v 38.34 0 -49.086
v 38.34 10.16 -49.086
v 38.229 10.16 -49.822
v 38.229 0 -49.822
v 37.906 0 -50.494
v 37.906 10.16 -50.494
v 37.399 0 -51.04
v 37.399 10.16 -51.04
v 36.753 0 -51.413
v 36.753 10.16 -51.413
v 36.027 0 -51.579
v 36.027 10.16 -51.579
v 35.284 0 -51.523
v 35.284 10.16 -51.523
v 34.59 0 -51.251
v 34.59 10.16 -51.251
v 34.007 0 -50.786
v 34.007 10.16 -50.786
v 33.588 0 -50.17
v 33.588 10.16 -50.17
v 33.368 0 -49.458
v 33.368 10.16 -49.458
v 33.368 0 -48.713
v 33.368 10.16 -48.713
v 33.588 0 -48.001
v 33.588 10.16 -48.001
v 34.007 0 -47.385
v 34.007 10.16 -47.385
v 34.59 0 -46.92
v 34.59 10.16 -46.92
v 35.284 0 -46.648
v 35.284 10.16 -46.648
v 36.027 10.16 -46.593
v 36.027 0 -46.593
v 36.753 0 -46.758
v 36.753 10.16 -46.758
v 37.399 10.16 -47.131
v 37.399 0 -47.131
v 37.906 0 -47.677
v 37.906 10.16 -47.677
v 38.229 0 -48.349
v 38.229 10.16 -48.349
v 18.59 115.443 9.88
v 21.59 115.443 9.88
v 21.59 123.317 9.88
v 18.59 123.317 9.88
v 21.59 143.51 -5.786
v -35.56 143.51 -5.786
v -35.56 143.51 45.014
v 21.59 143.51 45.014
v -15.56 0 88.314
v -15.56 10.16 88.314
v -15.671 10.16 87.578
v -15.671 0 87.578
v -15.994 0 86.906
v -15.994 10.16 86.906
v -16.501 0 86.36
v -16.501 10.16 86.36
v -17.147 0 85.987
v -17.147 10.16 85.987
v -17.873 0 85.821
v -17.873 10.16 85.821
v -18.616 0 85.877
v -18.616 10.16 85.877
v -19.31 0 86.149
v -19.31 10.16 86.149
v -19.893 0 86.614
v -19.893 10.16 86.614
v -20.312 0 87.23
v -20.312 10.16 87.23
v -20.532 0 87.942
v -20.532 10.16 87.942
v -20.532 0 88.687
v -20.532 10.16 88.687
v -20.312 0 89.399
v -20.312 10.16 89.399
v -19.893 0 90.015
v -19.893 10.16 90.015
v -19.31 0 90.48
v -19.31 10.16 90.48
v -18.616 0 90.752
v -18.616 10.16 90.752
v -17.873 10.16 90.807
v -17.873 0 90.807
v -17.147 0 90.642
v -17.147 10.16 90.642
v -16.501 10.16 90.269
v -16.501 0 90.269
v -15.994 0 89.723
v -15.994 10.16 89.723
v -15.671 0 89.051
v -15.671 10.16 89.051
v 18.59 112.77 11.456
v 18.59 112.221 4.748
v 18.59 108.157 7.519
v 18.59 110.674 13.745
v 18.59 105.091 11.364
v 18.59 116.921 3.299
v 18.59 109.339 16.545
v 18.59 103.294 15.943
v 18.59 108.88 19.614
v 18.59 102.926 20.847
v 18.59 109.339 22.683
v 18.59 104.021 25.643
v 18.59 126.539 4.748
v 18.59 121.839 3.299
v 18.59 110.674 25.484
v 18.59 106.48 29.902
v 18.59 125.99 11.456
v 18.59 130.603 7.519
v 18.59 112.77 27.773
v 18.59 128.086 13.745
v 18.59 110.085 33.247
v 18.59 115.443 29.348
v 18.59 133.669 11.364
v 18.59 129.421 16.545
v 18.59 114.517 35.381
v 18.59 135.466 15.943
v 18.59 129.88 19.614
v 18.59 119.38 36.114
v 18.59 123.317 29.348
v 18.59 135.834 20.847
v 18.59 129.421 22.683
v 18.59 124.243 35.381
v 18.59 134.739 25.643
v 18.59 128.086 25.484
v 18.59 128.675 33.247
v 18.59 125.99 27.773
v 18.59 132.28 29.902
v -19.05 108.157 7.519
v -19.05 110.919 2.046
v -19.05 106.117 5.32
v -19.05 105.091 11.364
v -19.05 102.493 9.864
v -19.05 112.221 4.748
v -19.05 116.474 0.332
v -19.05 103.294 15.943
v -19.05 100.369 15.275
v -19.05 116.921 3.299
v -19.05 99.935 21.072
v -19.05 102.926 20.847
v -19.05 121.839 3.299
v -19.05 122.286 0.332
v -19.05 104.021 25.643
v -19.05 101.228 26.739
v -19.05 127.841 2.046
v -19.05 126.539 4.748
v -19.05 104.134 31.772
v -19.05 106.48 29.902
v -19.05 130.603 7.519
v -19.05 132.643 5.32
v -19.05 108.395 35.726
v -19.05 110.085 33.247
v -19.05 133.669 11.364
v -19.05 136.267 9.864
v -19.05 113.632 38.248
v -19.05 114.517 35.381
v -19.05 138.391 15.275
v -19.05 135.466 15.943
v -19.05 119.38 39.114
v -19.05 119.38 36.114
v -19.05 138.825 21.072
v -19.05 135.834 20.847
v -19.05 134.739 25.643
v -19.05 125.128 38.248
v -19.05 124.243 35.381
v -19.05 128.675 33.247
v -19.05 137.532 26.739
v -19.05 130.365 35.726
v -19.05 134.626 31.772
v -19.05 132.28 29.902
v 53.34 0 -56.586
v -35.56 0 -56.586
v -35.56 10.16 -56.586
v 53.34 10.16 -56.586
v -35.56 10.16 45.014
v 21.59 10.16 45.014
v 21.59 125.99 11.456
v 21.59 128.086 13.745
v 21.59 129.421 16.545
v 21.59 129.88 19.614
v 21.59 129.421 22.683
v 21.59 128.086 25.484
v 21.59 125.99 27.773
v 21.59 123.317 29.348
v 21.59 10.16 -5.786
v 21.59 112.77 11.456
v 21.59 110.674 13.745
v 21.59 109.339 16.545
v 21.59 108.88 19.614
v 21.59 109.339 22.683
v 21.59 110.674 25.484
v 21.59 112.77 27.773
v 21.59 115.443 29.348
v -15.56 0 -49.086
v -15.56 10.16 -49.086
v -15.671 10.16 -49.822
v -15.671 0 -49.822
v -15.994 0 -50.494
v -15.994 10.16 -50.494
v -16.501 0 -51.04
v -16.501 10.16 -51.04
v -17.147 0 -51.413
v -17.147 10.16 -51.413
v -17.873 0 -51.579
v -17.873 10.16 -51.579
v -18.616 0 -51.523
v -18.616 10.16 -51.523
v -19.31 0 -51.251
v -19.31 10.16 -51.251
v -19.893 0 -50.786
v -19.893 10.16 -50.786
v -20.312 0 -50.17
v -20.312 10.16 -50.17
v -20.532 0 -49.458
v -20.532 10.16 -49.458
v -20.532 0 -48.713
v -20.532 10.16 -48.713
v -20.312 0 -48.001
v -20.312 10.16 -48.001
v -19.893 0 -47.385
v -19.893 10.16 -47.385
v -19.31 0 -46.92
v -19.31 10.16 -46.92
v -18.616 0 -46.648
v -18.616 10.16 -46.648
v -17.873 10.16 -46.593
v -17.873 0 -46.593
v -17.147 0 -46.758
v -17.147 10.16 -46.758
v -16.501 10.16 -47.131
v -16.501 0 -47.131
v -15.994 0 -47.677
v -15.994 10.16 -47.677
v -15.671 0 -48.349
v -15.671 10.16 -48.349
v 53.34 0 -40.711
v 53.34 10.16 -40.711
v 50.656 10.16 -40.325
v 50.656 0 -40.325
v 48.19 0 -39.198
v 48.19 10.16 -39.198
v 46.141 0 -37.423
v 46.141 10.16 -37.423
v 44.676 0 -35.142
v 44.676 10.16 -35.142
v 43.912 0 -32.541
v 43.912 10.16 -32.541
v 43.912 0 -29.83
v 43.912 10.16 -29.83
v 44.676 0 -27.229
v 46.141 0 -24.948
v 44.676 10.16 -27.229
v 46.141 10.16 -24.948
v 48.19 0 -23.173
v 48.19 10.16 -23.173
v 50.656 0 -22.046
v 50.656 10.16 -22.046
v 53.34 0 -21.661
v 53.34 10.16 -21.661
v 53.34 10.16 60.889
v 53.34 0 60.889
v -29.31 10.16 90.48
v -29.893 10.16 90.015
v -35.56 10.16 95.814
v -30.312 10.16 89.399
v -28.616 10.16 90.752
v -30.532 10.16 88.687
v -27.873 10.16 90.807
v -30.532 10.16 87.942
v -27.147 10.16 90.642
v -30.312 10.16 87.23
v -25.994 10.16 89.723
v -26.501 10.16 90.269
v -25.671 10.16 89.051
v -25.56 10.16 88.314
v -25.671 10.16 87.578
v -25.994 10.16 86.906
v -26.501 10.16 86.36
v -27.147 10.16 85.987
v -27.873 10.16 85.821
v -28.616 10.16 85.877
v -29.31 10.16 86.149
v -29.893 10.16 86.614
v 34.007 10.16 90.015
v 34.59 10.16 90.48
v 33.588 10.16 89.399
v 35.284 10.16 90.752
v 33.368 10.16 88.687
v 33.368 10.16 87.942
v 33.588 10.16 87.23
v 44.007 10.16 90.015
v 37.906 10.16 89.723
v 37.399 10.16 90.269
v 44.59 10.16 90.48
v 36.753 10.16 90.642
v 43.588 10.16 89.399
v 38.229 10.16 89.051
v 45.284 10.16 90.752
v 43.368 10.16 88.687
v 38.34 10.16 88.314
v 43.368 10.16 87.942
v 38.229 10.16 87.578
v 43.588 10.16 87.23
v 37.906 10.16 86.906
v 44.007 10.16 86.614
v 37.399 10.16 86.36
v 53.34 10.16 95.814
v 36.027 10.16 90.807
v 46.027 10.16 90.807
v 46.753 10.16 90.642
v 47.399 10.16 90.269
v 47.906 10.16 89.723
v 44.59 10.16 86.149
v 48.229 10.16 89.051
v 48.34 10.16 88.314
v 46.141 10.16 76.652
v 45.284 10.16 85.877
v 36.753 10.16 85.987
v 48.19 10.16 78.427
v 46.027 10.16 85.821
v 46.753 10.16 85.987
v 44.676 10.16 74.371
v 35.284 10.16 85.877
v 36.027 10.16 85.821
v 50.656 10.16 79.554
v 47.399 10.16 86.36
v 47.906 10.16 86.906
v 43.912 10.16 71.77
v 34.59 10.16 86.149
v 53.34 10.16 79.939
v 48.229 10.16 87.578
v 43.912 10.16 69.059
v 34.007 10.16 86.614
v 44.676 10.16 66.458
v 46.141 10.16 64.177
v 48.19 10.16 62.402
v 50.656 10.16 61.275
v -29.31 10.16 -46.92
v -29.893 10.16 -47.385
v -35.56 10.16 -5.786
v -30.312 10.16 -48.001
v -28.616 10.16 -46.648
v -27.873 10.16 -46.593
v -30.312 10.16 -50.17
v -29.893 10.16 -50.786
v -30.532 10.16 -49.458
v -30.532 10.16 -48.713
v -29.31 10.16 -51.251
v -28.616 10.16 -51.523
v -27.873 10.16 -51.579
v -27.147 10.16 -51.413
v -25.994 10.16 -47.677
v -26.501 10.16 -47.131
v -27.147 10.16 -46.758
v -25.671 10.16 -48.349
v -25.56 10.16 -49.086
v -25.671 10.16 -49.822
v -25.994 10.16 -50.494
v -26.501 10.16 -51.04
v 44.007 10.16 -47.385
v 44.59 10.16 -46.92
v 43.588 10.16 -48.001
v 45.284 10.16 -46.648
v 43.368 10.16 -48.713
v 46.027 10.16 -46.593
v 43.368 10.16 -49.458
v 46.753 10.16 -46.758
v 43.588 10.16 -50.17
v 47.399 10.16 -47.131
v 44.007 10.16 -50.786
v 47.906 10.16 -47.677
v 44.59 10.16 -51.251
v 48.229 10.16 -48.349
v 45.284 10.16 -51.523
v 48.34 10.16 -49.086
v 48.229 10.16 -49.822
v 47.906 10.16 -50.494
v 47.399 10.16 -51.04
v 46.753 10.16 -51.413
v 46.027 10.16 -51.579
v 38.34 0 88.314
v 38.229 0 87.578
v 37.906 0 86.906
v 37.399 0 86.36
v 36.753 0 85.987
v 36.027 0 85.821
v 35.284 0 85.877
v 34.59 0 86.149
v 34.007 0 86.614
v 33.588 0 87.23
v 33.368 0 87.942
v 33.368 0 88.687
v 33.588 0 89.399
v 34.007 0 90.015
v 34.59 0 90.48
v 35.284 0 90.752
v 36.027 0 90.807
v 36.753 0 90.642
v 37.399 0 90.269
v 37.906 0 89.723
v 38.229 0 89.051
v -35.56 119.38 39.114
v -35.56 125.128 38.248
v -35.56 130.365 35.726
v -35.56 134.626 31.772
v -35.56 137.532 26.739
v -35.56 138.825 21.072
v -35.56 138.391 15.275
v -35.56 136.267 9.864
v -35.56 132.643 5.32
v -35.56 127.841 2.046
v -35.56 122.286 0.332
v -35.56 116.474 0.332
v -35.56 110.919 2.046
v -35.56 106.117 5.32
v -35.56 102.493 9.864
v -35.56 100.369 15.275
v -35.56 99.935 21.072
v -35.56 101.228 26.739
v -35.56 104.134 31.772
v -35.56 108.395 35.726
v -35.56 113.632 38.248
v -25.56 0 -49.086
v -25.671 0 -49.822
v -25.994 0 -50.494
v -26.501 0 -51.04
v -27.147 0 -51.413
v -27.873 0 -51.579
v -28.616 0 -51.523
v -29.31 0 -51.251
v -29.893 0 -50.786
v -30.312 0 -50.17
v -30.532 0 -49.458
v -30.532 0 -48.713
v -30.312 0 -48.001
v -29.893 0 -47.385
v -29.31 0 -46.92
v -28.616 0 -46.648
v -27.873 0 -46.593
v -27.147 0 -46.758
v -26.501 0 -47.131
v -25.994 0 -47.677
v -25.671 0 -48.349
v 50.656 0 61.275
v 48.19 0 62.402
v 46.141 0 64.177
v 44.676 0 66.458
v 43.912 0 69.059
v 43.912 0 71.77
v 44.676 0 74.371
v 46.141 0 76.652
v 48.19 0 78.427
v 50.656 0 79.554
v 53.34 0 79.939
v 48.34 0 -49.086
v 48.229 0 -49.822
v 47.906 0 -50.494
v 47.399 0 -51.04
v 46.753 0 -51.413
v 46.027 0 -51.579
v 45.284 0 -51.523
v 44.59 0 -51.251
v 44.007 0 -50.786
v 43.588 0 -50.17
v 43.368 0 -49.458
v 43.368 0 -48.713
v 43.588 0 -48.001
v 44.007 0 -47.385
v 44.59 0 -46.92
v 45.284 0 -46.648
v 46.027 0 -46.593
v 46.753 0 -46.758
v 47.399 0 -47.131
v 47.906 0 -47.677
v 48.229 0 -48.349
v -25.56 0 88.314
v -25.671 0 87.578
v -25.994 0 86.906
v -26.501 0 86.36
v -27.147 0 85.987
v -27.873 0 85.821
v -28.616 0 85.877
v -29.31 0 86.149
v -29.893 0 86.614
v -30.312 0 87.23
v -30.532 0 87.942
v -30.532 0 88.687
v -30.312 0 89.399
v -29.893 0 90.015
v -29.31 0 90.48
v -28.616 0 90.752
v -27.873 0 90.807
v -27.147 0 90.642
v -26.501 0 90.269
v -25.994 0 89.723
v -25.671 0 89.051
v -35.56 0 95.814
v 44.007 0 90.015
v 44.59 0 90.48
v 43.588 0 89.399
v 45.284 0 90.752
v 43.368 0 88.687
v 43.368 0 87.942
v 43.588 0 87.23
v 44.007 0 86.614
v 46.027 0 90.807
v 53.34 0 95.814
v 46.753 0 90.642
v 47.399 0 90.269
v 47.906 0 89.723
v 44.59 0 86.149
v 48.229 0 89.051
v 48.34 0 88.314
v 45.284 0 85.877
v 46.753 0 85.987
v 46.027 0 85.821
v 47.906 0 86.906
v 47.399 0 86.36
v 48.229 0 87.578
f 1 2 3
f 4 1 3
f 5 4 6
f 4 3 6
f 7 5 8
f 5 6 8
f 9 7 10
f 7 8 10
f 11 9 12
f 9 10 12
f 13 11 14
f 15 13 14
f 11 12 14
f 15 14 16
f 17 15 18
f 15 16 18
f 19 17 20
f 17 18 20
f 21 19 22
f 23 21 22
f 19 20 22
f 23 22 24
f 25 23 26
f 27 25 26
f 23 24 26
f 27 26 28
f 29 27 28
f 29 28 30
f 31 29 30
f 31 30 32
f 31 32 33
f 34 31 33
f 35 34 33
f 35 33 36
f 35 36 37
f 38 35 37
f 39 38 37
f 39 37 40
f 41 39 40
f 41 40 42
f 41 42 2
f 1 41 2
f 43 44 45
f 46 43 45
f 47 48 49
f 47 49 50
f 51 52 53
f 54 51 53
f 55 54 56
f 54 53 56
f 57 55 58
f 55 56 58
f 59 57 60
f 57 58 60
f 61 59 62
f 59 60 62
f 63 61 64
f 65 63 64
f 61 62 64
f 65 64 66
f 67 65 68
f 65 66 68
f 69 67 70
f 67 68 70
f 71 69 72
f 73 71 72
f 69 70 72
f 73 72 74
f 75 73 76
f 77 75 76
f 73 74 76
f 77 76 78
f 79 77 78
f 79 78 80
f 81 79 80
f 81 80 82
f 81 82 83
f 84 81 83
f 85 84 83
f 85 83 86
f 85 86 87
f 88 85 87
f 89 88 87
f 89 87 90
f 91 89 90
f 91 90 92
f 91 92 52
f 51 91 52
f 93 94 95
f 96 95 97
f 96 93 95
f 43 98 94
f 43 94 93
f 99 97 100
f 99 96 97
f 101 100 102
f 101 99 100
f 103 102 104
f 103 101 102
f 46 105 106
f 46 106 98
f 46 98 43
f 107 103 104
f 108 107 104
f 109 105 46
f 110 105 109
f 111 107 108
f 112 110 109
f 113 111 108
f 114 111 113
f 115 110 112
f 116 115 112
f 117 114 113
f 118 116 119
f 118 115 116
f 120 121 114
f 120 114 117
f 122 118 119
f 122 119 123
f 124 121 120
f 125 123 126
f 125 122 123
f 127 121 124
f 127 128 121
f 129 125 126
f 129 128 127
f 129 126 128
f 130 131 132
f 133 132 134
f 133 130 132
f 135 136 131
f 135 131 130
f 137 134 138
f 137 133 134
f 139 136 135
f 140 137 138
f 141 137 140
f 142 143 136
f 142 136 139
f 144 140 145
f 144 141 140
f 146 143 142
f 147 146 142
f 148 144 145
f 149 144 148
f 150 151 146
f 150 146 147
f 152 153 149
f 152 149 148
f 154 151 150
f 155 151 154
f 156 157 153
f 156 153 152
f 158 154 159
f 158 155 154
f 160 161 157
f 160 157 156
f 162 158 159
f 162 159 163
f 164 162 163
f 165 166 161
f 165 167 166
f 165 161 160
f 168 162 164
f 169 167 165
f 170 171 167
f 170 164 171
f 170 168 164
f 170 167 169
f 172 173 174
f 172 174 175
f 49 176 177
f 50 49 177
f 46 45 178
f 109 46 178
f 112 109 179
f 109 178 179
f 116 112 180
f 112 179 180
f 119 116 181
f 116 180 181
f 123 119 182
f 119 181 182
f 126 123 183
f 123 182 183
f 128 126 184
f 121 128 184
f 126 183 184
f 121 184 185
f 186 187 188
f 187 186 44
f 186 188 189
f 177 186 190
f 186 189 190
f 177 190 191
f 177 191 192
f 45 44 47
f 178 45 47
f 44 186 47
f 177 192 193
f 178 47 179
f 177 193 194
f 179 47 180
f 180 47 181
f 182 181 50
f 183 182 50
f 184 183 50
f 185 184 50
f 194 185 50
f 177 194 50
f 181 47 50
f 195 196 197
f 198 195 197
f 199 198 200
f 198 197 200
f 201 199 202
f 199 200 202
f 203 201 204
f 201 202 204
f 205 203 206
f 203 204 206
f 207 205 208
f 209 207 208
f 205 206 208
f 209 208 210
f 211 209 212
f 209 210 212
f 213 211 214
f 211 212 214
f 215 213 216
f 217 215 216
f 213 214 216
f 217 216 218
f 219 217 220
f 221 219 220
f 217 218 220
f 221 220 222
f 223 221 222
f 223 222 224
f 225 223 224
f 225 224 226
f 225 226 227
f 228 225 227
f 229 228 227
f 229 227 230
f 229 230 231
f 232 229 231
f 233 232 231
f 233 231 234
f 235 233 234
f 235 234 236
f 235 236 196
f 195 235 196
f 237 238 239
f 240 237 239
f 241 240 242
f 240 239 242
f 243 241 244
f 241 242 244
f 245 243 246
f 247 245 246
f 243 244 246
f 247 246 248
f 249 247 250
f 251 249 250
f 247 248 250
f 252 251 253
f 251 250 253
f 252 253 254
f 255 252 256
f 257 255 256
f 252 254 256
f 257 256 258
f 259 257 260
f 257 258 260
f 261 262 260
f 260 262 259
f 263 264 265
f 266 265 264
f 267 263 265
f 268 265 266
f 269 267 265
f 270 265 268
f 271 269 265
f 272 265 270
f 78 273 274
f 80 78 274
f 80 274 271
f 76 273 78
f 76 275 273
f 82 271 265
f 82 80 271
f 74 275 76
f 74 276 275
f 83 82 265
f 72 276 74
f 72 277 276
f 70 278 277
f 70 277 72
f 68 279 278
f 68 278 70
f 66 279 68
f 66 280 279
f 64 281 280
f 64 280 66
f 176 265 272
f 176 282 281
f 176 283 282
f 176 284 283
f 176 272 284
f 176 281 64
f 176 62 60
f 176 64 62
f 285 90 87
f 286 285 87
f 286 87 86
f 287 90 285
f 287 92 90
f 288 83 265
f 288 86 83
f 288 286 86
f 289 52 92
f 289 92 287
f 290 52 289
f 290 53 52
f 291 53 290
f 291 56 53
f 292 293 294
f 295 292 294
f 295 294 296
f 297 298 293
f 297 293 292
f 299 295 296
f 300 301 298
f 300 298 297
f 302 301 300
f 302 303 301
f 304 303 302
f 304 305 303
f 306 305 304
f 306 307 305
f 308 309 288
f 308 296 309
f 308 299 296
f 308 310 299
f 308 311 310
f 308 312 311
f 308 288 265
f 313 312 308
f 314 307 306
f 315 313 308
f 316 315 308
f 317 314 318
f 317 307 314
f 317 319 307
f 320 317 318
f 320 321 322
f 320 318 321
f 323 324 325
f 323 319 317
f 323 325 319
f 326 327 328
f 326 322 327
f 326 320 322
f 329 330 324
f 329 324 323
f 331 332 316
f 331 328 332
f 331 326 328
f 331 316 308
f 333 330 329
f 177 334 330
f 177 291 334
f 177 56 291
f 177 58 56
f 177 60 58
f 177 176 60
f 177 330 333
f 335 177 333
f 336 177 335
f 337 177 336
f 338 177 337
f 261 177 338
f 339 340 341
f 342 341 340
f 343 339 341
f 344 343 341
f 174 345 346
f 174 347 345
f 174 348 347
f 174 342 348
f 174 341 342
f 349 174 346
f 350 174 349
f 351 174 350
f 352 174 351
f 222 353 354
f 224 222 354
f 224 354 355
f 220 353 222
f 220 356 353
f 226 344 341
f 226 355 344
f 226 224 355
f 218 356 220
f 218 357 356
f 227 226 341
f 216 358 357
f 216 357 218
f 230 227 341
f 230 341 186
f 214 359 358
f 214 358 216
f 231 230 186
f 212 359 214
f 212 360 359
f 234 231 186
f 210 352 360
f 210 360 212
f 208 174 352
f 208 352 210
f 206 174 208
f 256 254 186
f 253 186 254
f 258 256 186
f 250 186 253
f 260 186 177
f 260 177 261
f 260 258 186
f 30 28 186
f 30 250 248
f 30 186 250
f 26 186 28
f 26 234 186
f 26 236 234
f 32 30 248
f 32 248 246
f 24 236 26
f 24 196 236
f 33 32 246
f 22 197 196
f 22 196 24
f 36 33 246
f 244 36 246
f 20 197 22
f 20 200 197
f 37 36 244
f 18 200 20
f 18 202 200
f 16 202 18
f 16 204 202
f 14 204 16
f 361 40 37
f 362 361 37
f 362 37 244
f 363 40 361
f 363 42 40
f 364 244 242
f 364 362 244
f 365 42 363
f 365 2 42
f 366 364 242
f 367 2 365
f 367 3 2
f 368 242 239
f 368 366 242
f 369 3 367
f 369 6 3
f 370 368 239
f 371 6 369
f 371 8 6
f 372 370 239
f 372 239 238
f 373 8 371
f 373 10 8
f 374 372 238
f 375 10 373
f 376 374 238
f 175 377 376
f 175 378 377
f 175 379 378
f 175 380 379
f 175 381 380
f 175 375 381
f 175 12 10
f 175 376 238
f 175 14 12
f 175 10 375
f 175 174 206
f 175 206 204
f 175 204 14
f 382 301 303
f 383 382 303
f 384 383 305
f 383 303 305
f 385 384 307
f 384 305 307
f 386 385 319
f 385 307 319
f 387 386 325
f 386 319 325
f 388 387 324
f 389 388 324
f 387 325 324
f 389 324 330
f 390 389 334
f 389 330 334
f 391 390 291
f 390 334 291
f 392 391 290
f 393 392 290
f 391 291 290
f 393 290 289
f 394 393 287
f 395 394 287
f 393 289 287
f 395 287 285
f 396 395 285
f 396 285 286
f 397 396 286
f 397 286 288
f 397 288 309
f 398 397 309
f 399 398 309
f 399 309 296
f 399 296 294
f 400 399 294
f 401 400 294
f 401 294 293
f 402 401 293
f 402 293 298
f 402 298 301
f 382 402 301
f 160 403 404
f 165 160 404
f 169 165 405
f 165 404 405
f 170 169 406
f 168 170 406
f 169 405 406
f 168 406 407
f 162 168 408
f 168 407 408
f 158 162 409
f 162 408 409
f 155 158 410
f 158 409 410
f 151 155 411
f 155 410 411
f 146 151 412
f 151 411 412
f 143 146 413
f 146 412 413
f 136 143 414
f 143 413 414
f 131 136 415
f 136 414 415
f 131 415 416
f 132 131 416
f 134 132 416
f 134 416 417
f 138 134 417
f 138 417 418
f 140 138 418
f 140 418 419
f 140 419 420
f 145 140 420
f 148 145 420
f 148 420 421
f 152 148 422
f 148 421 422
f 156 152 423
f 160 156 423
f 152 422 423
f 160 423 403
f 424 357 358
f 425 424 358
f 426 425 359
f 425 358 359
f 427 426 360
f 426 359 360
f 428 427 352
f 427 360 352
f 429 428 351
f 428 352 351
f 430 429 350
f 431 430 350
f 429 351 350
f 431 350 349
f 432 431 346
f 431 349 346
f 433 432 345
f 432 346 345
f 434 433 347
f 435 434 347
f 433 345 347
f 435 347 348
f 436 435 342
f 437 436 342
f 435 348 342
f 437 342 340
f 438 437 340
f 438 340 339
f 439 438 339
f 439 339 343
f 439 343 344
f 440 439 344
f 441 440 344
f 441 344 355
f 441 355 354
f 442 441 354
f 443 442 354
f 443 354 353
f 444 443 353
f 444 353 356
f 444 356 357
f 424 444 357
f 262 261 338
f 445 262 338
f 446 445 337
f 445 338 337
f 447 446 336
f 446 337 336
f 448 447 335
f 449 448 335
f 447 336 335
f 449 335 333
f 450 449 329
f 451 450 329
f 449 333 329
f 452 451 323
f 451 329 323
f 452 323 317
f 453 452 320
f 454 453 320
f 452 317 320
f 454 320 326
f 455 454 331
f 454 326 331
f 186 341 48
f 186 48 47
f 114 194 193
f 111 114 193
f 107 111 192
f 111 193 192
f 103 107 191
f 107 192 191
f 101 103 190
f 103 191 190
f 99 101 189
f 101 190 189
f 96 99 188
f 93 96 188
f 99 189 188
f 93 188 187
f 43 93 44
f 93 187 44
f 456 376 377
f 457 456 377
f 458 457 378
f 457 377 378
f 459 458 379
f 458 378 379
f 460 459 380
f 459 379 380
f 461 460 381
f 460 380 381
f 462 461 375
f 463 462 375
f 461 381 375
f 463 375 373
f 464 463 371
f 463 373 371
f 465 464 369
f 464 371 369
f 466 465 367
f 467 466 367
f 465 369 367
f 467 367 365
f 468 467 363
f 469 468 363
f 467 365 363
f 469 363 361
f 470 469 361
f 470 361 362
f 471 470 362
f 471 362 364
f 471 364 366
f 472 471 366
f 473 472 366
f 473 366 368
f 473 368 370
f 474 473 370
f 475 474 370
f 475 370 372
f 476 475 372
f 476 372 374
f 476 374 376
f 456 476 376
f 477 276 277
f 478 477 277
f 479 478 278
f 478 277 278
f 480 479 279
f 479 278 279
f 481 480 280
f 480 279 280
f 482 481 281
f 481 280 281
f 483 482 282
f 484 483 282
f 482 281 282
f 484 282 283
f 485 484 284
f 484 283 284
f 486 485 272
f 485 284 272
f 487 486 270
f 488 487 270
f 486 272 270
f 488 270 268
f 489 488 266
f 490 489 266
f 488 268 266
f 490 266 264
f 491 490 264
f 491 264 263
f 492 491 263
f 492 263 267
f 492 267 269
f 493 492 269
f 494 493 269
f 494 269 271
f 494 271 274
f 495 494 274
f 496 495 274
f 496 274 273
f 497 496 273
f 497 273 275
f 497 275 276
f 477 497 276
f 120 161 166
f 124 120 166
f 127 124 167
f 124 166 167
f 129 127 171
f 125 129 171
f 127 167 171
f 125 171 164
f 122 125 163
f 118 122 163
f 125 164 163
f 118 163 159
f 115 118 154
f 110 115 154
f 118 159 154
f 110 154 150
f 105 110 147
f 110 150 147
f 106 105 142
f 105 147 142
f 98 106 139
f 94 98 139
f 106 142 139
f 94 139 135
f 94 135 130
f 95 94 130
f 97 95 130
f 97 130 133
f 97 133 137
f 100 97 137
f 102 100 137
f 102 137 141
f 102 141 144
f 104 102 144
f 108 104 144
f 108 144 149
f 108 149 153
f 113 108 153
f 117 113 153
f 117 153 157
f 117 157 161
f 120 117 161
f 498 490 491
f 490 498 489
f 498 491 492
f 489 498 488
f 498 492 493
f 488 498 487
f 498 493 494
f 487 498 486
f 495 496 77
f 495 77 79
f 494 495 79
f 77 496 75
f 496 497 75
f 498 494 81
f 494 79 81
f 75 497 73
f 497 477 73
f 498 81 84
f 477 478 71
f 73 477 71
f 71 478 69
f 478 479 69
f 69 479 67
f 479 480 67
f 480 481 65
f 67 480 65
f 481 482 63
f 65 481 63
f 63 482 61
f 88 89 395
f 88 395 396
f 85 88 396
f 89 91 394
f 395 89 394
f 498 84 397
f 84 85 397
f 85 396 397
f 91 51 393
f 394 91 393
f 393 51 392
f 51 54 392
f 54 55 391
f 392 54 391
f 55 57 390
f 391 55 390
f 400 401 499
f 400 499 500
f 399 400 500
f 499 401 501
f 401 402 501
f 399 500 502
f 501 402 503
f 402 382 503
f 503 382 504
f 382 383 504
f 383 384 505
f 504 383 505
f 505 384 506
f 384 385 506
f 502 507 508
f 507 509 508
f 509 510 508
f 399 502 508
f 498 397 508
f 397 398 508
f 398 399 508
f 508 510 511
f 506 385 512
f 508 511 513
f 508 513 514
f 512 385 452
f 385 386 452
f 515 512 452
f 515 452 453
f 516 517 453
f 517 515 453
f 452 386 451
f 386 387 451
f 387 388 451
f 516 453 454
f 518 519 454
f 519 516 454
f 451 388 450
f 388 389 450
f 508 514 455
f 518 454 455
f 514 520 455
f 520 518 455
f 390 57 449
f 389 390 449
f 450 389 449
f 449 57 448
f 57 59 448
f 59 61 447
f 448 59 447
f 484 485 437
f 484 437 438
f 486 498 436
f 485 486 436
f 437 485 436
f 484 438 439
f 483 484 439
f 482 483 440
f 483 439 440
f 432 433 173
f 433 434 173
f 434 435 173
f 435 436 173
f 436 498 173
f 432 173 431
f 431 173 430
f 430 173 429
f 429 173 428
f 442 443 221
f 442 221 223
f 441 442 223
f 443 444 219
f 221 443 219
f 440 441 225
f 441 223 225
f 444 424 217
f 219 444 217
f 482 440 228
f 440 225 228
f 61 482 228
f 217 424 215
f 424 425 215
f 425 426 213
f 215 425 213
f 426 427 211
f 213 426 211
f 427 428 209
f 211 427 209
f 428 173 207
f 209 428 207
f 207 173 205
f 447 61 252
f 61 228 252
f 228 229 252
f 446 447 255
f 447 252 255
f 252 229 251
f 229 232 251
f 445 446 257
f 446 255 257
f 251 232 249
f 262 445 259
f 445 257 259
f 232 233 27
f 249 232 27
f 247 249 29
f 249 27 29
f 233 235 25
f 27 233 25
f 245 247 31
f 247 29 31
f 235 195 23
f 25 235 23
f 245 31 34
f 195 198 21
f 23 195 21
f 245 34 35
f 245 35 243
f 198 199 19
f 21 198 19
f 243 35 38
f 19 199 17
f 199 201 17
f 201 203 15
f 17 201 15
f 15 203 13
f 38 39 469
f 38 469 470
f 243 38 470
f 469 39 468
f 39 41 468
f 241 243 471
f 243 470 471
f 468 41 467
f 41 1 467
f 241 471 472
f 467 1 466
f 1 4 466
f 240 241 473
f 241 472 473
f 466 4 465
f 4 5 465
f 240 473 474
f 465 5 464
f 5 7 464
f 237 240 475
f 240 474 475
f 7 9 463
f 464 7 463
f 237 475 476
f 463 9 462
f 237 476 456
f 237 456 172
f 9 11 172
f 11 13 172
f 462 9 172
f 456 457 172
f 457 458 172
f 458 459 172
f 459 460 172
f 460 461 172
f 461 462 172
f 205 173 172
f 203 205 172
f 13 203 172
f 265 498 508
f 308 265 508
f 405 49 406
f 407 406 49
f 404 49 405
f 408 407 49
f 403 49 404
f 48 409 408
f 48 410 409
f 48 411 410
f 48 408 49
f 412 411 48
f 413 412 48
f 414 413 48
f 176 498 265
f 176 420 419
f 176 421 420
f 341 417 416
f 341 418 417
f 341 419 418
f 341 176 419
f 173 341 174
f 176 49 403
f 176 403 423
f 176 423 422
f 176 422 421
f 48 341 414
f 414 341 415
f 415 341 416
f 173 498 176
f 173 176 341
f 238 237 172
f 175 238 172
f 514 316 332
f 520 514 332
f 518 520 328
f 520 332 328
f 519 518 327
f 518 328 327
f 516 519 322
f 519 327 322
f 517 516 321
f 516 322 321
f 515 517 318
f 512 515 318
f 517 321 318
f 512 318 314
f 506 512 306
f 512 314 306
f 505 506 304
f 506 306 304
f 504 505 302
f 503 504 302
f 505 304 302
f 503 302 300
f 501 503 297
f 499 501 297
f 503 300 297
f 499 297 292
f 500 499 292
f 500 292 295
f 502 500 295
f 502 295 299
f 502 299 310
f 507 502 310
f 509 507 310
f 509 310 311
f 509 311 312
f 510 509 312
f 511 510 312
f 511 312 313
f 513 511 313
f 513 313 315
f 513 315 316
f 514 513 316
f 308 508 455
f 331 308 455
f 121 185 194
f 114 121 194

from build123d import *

# Parameters (mm, degrees)
SKETCH2_W           = 88.9
SKETCH2_H           = 152.4
BOSS_EXTRUDE1_DEPTH = 10.16
SKETCH5_W           = 57.15
SKETCH5_H           = 50.8
BOSS_EXTRUDE2_DEPTH = 133.35
SKETCH6_R           = 2.5
CUT_EXTRUDE1_DEPTH  = 11.16
SKETCH7_R           = 10.5
CUT_EXTRUDE2_DEPTH  = 58.15
SKETCH8_R           = 16.5
CUT_EXTRUDE3_DEPTH  = 54.15
SKETCH9_R           = 19.5
CUT_EXTRUDE4_DEPTH  = 16.51
BOSS_EXTRUDE3_DEPTH = 3
SKETCH12_R          = 9.525
CUT_EXTRUDE6_DEPTH  = 12.7


with BuildPart() as part:
    # Sketch2 → Boss-Extrude1 (new body)
    with BuildSketch(Plane(origin=(0, 0, 0), x_dir=(1, 0, 0), z_dir=(0, 1, 0))):
        with Locations((8.89, -19.614444444)):
            Rectangle(SKETCH2_W, SKETCH2_H)
    extrude(amount=BOSS_EXTRUDE1_DEPTH)

    # Sketch5 → Boss-Extrude2 (add)
    with BuildSketch(Plane(origin=(0, 10.16, 0), x_dir=(1, 0, 0), z_dir=(0, 1, 0))):
        with Locations((-6.985, -19.614444444)):
            Rectangle(SKETCH5_W, SKETCH5_H)
    extrude(amount=BOSS_EXTRUDE2_DEPTH)

    # Sketch6 → Cut-Extrude1 (cut, through all)
    with BuildSketch(Plane(origin=(0, 10.16, 0), x_dir=(1, 0, 0), z_dir=(0, 1, 0))):
        with Locations((35.84, -88.314444444)):
            Circle(SKETCH6_R)
        with Locations((45.84, -88.314444444)):
            Circle(SKETCH6_R)
        with Locations((-28.06, -88.314444444)):
            Circle(SKETCH6_R)
        with Locations((-18.06, -88.314444444)):
            Circle(SKETCH6_R)
        with Locations((-28.06, 49.085555556)):
            Circle(SKETCH6_R)
        with Locations((-18.06, 49.085555556)):
            Circle(SKETCH6_R)
        with Locations((35.84, 49.085555556)):
            Circle(SKETCH6_R)
        with Locations((45.84, 49.085555556)):
            Circle(SKETCH6_R)
    extrude(amount=-CUT_EXTRUDE1_DEPTH, mode=Mode.SUBTRACT)

    # Sketch7 → Cut-Extrude2 (cut, through all)
    with BuildSketch(Plane(origin=(21.59, 0, 0), x_dir=(0, 0, -1), z_dir=(1, 0, 0))):
        with Locations((-19.614444444, 119.38)):
            Circle(SKETCH7_R)
    extrude(amount=-CUT_EXTRUDE2_DEPTH, mode=Mode.SUBTRACT)

    # Sketch8 → Cut-Extrude3 (cut)
    with BuildSketch(Plane.ZY.offset(35.56)):
        with Locations((19.614444444, 119.38)):
            Circle(SKETCH8_R)
    extrude(amount=-CUT_EXTRUDE3_DEPTH, mode=Mode.SUBTRACT)

    # Sketch9 → Cut-Extrude4 (cut)
    with BuildSketch(Plane.ZY.offset(35.56)):
        with Locations((19.614444444, 119.38)):
            Circle(SKETCH9_R)
    extrude(amount=-CUT_EXTRUDE4_DEPTH, mode=Mode.SUBTRACT)

    # Sketch10 → Boss-Extrude3 (add)
    with BuildSketch(Plane(origin=(21.59, 0, 0), x_dir=(0, 0, -1), z_dir=(1, 0, 0))):
        with BuildLine():
            Line((-29.348407204, 123.317), (-29.348407204, 115.443))
            ThreePointArc((-29.348407204, 115.443), (-30.114444444, 119.38), (-29.348407204, 123.317))
        make_face()
        with BuildLine():
            Line((-9.880481685, 115.443), (-9.880481685, 123.317))
            ThreePointArc((-9.880481685, 123.317), (-9.114444444, 119.38), (-9.880481685, 115.443))
        make_face()
    extrude(amount=-BOSS_EXTRUDE3_DEPTH)

    # Sketch12 → Cut-Extrude6 (cut)
    with BuildSketch(Plane(origin=(0, 10.16, 0), x_dir=(1, 0, 0), z_dir=(0, 1, 0))):
        with Locations((53.34, -70.414444444)):
            Circle(SKETCH12_R)
        with Locations((53.34, 31.185555556)):
            Circle(SKETCH12_R)
    extrude(amount=-CUT_EXTRUDE6_DEPTH, mode=Mode.SUBTRACT)


solid = part.part
